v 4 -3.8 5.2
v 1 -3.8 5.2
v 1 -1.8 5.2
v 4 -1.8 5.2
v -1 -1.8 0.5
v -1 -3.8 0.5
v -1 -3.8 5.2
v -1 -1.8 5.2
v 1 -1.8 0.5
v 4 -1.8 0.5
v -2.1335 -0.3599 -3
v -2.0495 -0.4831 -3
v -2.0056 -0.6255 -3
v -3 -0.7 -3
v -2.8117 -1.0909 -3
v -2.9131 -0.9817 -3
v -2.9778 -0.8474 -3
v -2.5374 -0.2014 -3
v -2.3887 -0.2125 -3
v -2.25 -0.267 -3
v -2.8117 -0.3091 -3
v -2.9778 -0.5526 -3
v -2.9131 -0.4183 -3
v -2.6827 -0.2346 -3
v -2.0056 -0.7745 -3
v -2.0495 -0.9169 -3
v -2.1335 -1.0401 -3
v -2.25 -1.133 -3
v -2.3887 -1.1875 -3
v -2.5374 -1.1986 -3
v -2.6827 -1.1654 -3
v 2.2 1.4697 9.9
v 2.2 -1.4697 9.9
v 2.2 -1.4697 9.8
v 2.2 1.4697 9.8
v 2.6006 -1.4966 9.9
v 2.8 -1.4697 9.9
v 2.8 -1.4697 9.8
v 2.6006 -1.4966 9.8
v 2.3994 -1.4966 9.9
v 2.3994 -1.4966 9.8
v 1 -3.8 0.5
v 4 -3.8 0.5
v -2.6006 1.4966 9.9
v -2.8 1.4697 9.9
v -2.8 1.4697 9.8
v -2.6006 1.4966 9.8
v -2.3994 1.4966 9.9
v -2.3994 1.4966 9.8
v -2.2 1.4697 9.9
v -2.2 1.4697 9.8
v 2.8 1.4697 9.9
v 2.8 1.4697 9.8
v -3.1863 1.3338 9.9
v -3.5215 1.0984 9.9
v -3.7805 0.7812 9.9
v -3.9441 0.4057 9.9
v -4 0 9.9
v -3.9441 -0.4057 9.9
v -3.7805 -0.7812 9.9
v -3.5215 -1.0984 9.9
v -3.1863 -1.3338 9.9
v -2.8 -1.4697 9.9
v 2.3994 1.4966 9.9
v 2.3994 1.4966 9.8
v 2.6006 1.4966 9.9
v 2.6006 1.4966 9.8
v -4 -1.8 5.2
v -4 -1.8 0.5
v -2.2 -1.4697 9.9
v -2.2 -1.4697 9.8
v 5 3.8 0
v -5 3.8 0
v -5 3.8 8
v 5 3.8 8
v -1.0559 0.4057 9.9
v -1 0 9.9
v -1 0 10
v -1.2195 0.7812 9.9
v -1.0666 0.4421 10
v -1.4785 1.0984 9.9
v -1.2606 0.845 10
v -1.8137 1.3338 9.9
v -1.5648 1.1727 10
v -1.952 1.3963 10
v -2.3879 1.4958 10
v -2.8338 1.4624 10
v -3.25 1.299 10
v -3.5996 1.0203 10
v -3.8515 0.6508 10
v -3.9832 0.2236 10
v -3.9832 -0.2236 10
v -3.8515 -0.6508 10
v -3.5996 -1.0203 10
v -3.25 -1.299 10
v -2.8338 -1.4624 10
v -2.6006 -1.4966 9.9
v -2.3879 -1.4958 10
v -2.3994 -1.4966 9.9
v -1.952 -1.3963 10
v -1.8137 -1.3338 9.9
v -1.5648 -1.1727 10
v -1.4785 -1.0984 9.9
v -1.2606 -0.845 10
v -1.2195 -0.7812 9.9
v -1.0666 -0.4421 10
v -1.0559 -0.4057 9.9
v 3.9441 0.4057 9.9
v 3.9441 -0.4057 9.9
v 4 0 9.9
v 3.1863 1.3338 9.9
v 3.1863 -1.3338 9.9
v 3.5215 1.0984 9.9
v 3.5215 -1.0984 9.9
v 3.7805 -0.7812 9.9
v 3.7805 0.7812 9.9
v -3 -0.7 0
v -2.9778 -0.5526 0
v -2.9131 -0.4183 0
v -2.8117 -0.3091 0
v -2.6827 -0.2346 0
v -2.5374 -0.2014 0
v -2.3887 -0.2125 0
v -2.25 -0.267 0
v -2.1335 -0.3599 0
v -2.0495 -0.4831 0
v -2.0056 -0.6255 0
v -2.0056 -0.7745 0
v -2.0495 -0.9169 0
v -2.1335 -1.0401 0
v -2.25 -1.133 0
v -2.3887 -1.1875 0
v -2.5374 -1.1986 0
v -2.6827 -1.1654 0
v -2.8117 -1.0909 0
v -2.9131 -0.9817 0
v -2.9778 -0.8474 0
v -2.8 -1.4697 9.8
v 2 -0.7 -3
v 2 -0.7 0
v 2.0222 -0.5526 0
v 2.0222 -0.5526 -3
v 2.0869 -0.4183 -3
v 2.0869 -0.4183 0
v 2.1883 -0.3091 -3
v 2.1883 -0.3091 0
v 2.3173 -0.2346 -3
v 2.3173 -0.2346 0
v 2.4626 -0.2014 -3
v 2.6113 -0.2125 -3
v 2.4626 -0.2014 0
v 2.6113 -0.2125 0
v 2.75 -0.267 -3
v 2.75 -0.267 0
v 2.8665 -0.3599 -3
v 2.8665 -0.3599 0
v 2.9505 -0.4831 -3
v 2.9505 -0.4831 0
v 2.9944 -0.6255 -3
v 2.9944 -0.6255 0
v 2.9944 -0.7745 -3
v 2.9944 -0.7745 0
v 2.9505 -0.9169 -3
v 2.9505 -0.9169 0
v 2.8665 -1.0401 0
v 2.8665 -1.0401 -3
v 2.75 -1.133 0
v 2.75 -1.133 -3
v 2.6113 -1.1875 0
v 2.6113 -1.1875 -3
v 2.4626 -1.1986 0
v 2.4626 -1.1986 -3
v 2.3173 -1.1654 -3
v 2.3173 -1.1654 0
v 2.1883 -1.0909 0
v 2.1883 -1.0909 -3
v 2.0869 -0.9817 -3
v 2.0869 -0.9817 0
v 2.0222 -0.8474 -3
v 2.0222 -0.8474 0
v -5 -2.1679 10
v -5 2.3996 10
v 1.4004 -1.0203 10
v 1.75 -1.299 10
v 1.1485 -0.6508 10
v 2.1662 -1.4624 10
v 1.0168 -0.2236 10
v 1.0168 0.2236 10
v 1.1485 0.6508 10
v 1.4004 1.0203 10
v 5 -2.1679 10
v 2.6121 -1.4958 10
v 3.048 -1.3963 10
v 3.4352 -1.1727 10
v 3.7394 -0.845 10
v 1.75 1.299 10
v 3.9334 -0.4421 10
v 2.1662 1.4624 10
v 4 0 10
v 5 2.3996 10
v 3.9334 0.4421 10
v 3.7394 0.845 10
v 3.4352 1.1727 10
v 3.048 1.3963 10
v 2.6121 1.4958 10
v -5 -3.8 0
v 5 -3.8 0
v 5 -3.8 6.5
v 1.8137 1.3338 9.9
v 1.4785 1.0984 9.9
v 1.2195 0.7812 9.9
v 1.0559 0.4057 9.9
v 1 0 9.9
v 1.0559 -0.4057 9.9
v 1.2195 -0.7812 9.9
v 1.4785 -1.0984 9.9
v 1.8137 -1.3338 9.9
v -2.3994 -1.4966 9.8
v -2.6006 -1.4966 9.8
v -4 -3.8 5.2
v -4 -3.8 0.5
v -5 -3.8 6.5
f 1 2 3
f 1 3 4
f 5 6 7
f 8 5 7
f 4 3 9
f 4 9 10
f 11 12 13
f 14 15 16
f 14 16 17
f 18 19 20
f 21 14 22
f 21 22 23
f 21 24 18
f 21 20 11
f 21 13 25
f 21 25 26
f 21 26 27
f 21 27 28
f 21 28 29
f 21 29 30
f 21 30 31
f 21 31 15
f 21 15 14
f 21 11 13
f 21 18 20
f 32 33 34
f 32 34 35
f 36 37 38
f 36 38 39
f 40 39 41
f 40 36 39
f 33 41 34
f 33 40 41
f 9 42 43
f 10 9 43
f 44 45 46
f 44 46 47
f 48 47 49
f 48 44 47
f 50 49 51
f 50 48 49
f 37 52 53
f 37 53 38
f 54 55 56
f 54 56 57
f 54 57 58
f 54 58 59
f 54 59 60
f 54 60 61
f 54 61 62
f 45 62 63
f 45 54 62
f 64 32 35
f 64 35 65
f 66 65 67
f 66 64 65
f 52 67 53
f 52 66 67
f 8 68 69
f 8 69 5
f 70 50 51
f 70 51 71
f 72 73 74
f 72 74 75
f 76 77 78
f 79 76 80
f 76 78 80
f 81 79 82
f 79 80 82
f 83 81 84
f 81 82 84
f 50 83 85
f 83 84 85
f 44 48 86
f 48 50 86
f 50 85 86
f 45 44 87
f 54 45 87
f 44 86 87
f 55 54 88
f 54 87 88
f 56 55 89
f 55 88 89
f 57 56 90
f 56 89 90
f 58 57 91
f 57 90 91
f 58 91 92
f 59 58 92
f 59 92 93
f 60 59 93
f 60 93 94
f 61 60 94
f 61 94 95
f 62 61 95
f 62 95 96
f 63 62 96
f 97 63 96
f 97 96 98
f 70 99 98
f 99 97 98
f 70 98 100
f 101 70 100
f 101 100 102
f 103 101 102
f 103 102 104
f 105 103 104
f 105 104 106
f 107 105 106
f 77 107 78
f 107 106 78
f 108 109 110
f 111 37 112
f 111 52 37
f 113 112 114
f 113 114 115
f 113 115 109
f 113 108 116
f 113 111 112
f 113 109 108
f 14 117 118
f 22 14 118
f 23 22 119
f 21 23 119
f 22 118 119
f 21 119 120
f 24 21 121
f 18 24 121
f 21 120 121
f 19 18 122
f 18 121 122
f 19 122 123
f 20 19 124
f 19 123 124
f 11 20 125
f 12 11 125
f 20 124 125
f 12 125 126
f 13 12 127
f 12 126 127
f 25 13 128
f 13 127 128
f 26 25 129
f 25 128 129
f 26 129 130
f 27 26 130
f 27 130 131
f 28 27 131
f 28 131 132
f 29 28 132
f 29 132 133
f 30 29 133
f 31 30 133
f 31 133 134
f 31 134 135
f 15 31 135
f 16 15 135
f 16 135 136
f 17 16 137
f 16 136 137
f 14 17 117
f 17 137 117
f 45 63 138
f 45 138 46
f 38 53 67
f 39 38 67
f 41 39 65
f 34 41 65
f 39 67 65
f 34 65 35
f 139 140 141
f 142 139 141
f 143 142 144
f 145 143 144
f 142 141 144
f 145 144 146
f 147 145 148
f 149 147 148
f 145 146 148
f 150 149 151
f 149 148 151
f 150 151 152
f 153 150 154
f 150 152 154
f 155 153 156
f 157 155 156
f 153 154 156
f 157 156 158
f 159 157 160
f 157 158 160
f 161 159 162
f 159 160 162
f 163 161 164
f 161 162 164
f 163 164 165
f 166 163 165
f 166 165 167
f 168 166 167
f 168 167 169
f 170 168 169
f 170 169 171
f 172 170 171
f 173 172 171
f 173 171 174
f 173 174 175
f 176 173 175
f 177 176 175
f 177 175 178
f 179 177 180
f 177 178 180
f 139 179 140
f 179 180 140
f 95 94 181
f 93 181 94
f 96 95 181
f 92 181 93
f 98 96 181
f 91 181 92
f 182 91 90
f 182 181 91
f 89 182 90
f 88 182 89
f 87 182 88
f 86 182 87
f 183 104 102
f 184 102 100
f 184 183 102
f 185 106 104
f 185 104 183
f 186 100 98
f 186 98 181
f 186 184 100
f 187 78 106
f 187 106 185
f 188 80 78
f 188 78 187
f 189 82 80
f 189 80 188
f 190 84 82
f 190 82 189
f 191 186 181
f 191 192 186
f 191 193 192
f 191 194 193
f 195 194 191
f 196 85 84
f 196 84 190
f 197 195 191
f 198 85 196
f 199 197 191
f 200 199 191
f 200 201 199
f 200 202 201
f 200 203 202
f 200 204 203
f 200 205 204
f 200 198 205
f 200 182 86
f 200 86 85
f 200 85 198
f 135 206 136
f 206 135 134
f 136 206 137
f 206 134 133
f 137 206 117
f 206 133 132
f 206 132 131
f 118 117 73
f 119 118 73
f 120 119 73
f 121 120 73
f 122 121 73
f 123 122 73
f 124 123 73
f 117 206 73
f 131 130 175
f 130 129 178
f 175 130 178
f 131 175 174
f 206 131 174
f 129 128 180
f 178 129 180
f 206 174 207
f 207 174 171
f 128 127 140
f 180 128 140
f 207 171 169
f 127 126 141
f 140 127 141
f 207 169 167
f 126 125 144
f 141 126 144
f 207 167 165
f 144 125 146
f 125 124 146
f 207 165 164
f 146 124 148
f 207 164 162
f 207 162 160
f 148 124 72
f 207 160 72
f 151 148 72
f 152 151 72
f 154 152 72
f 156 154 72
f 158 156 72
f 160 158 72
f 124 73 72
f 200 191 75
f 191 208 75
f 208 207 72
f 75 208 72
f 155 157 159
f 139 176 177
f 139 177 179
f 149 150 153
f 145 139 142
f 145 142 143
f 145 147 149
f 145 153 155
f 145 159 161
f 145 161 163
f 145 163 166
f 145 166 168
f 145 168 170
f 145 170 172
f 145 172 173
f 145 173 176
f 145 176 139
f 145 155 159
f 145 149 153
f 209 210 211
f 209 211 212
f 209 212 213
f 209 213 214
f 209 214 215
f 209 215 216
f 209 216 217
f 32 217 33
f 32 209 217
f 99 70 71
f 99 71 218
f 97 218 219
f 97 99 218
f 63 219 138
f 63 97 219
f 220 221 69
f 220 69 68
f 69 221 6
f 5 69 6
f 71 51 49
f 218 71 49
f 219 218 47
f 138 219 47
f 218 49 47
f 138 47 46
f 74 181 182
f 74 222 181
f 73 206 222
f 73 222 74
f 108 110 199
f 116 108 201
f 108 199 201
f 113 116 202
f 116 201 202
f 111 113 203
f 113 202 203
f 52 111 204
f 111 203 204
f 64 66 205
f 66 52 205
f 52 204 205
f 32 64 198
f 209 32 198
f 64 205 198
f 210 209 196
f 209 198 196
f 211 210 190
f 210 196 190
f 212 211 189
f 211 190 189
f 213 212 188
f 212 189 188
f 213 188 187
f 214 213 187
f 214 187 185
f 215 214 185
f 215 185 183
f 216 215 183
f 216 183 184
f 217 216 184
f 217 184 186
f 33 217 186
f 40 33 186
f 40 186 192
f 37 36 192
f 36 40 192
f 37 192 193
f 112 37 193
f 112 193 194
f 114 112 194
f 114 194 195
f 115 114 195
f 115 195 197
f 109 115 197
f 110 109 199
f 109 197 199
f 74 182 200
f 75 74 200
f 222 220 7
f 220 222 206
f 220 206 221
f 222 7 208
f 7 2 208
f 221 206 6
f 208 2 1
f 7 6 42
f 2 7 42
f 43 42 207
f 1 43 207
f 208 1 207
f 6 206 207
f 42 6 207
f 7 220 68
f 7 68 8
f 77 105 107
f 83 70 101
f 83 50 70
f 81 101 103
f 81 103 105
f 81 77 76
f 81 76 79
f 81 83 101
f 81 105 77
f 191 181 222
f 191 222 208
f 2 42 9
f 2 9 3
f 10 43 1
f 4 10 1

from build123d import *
from build123d.topology import SkipClean

# Parameters (mm, degrees)
SKETCH_1_W             = 10
SKETCH_1_H             = 7.6
EXTRUDE_1_DEPTH        = 10
SKETCH_2_R             = 1.5
CUT_EXTRUDE_1_DEPTH    = 0.1
CUT_EXTRUDE_2_DEPTH    = 0.1
SKETCH_4_W             = 3
SKETCH_4_H             = 4.7
CUT_EXTRUDE_3_DEPTH    = 2
SKETCH_5_R             = 0.5
EXTRUDE_2_DEPTH        = 3
PATTERN_LINEAR_1_COUNT = 2
PATTERN_LINEAR_1_PITCH = 5
CHAMFER_1_SIZE         = 3.5
CHAMFER_1_SIZE2        = 1.632076804
CHAMFER_2_SIZE         = 2
CHAMFER_2_SIZE2        = 1.400415076


with BuildPart() as part:
    # Эскиз1 → Бобышка-Вытянуть1 (new body)
    with BuildSketch(Plane.XY):
        Rectangle(SKETCH_1_W, SKETCH_1_H)
    extrude(amount=EXTRUDE_1_DEPTH)

    # Эскиз2 → Вырез-Вытянуть1 (cut)
    with BuildSketch(Plane.XY.offset(10)):
        with Locations((2.5, 0)):
            Circle(SKETCH_2_R)
    cut_extrude_1 = extrude(amount=-CUT_EXTRUDE_1_DEPTH, mode=Mode.SUBTRACT)

    # Эскиз3 → Вырез-Вытянуть2 (cut)
    with SkipClean():  # the faces are left unmerged after this step: merging them gives an invalid solid
        with BuildSketch(Plane.XY.offset(9.9)):
            with BuildLine():
                Line((2.2, -1.469693846), (2.2, 1.469693846))
                ThreePointArc((2.2, 1.469693846), (2.5, 1.5), (2.8, 1.469693846))
                Line((2.8, 1.469693846), (2.8, -1.469693846))
                ThreePointArc((2.8, -1.469693846), (2.5, -1.5), (2.2, -1.469693846))
            make_face()
        cut_extrude_2 = extrude(amount=-CUT_EXTRUDE_2_DEPTH, mode=Mode.SUBTRACT)

    # Эскиз4 → Вырез-Вытянуть3 (cut)
    with SkipClean():  # the faces are left unmerged after this step: merging them gives an invalid solid
        with BuildSketch(Plane.XZ.offset(3.8)):
            with Locations((2.5, 2.85)):
                Rectangle(SKETCH_4_W, SKETCH_4_H)
        cut_extrude_3 = extrude(amount=-CUT_EXTRUDE_3_DEPTH, mode=Mode.SUBTRACT)

    # Эскиз5 → Бобышка-Вытянуть2 (add)
    with SkipClean():  # the faces are left unmerged after this step: merging them gives an invalid solid
        with BuildSketch(Plane(origin=(0, 0, 0), x_dir=(-1, 0, 0), z_dir=(0, 0, -1))):
            with Locations((-2.5, -0.7)):
                Circle(SKETCH_5_R)
        extrude_2 = extrude(amount=EXTRUDE_2_DEPTH)

    # Линейный массив1: Вырез-Вытянуть1, Вырез-Вытянуть2, Вырез-Вытянуть3, Бобышка-Вытянуть2 ×2
    with SkipClean():  # the faces are left unmerged after this step: merging them gives an invalid solid
        with Locations(*[(-i * PATTERN_LINEAR_1_PITCH, 0, 0) for i in range(1, PATTERN_LINEAR_1_COUNT)]):
            add(cut_extrude_1, mode=Mode.SUBTRACT)
            add(cut_extrude_2, mode=Mode.SUBTRACT)
            add(cut_extrude_3, mode=Mode.SUBTRACT)
            add(extrude_2)

    # Фаска1
    chamfer_1_edges = [part.edges().sort_by_distance(p)[0] for p in [
        (0, -3.8, 10),
    ]]
    chamfer_1_side = [part.faces().sort_by_distance(p)[0] for p in [
        (0, -3.8, 5.844428969),
    ]]
    chamfer(chamfer_1_edges, length=CHAMFER_1_SIZE, length2=CHAMFER_1_SIZE2, reference=chamfer_1_side[0])

    # Фаска2
    chamfer_2_edges = [part.edges().sort_by_distance(p)[0] for p in [
        (0, 3.8, 10),
    ]]
    chamfer_2_side = [part.faces().sort_by_distance(p)[0] for p in [
        (0, 3.8, 5),
    ]]
    chamfer(chamfer_2_edges, length=CHAMFER_2_SIZE, length2=CHAMFER_2_SIZE2, reference=chamfer_2_side[0])


solid = part.part
